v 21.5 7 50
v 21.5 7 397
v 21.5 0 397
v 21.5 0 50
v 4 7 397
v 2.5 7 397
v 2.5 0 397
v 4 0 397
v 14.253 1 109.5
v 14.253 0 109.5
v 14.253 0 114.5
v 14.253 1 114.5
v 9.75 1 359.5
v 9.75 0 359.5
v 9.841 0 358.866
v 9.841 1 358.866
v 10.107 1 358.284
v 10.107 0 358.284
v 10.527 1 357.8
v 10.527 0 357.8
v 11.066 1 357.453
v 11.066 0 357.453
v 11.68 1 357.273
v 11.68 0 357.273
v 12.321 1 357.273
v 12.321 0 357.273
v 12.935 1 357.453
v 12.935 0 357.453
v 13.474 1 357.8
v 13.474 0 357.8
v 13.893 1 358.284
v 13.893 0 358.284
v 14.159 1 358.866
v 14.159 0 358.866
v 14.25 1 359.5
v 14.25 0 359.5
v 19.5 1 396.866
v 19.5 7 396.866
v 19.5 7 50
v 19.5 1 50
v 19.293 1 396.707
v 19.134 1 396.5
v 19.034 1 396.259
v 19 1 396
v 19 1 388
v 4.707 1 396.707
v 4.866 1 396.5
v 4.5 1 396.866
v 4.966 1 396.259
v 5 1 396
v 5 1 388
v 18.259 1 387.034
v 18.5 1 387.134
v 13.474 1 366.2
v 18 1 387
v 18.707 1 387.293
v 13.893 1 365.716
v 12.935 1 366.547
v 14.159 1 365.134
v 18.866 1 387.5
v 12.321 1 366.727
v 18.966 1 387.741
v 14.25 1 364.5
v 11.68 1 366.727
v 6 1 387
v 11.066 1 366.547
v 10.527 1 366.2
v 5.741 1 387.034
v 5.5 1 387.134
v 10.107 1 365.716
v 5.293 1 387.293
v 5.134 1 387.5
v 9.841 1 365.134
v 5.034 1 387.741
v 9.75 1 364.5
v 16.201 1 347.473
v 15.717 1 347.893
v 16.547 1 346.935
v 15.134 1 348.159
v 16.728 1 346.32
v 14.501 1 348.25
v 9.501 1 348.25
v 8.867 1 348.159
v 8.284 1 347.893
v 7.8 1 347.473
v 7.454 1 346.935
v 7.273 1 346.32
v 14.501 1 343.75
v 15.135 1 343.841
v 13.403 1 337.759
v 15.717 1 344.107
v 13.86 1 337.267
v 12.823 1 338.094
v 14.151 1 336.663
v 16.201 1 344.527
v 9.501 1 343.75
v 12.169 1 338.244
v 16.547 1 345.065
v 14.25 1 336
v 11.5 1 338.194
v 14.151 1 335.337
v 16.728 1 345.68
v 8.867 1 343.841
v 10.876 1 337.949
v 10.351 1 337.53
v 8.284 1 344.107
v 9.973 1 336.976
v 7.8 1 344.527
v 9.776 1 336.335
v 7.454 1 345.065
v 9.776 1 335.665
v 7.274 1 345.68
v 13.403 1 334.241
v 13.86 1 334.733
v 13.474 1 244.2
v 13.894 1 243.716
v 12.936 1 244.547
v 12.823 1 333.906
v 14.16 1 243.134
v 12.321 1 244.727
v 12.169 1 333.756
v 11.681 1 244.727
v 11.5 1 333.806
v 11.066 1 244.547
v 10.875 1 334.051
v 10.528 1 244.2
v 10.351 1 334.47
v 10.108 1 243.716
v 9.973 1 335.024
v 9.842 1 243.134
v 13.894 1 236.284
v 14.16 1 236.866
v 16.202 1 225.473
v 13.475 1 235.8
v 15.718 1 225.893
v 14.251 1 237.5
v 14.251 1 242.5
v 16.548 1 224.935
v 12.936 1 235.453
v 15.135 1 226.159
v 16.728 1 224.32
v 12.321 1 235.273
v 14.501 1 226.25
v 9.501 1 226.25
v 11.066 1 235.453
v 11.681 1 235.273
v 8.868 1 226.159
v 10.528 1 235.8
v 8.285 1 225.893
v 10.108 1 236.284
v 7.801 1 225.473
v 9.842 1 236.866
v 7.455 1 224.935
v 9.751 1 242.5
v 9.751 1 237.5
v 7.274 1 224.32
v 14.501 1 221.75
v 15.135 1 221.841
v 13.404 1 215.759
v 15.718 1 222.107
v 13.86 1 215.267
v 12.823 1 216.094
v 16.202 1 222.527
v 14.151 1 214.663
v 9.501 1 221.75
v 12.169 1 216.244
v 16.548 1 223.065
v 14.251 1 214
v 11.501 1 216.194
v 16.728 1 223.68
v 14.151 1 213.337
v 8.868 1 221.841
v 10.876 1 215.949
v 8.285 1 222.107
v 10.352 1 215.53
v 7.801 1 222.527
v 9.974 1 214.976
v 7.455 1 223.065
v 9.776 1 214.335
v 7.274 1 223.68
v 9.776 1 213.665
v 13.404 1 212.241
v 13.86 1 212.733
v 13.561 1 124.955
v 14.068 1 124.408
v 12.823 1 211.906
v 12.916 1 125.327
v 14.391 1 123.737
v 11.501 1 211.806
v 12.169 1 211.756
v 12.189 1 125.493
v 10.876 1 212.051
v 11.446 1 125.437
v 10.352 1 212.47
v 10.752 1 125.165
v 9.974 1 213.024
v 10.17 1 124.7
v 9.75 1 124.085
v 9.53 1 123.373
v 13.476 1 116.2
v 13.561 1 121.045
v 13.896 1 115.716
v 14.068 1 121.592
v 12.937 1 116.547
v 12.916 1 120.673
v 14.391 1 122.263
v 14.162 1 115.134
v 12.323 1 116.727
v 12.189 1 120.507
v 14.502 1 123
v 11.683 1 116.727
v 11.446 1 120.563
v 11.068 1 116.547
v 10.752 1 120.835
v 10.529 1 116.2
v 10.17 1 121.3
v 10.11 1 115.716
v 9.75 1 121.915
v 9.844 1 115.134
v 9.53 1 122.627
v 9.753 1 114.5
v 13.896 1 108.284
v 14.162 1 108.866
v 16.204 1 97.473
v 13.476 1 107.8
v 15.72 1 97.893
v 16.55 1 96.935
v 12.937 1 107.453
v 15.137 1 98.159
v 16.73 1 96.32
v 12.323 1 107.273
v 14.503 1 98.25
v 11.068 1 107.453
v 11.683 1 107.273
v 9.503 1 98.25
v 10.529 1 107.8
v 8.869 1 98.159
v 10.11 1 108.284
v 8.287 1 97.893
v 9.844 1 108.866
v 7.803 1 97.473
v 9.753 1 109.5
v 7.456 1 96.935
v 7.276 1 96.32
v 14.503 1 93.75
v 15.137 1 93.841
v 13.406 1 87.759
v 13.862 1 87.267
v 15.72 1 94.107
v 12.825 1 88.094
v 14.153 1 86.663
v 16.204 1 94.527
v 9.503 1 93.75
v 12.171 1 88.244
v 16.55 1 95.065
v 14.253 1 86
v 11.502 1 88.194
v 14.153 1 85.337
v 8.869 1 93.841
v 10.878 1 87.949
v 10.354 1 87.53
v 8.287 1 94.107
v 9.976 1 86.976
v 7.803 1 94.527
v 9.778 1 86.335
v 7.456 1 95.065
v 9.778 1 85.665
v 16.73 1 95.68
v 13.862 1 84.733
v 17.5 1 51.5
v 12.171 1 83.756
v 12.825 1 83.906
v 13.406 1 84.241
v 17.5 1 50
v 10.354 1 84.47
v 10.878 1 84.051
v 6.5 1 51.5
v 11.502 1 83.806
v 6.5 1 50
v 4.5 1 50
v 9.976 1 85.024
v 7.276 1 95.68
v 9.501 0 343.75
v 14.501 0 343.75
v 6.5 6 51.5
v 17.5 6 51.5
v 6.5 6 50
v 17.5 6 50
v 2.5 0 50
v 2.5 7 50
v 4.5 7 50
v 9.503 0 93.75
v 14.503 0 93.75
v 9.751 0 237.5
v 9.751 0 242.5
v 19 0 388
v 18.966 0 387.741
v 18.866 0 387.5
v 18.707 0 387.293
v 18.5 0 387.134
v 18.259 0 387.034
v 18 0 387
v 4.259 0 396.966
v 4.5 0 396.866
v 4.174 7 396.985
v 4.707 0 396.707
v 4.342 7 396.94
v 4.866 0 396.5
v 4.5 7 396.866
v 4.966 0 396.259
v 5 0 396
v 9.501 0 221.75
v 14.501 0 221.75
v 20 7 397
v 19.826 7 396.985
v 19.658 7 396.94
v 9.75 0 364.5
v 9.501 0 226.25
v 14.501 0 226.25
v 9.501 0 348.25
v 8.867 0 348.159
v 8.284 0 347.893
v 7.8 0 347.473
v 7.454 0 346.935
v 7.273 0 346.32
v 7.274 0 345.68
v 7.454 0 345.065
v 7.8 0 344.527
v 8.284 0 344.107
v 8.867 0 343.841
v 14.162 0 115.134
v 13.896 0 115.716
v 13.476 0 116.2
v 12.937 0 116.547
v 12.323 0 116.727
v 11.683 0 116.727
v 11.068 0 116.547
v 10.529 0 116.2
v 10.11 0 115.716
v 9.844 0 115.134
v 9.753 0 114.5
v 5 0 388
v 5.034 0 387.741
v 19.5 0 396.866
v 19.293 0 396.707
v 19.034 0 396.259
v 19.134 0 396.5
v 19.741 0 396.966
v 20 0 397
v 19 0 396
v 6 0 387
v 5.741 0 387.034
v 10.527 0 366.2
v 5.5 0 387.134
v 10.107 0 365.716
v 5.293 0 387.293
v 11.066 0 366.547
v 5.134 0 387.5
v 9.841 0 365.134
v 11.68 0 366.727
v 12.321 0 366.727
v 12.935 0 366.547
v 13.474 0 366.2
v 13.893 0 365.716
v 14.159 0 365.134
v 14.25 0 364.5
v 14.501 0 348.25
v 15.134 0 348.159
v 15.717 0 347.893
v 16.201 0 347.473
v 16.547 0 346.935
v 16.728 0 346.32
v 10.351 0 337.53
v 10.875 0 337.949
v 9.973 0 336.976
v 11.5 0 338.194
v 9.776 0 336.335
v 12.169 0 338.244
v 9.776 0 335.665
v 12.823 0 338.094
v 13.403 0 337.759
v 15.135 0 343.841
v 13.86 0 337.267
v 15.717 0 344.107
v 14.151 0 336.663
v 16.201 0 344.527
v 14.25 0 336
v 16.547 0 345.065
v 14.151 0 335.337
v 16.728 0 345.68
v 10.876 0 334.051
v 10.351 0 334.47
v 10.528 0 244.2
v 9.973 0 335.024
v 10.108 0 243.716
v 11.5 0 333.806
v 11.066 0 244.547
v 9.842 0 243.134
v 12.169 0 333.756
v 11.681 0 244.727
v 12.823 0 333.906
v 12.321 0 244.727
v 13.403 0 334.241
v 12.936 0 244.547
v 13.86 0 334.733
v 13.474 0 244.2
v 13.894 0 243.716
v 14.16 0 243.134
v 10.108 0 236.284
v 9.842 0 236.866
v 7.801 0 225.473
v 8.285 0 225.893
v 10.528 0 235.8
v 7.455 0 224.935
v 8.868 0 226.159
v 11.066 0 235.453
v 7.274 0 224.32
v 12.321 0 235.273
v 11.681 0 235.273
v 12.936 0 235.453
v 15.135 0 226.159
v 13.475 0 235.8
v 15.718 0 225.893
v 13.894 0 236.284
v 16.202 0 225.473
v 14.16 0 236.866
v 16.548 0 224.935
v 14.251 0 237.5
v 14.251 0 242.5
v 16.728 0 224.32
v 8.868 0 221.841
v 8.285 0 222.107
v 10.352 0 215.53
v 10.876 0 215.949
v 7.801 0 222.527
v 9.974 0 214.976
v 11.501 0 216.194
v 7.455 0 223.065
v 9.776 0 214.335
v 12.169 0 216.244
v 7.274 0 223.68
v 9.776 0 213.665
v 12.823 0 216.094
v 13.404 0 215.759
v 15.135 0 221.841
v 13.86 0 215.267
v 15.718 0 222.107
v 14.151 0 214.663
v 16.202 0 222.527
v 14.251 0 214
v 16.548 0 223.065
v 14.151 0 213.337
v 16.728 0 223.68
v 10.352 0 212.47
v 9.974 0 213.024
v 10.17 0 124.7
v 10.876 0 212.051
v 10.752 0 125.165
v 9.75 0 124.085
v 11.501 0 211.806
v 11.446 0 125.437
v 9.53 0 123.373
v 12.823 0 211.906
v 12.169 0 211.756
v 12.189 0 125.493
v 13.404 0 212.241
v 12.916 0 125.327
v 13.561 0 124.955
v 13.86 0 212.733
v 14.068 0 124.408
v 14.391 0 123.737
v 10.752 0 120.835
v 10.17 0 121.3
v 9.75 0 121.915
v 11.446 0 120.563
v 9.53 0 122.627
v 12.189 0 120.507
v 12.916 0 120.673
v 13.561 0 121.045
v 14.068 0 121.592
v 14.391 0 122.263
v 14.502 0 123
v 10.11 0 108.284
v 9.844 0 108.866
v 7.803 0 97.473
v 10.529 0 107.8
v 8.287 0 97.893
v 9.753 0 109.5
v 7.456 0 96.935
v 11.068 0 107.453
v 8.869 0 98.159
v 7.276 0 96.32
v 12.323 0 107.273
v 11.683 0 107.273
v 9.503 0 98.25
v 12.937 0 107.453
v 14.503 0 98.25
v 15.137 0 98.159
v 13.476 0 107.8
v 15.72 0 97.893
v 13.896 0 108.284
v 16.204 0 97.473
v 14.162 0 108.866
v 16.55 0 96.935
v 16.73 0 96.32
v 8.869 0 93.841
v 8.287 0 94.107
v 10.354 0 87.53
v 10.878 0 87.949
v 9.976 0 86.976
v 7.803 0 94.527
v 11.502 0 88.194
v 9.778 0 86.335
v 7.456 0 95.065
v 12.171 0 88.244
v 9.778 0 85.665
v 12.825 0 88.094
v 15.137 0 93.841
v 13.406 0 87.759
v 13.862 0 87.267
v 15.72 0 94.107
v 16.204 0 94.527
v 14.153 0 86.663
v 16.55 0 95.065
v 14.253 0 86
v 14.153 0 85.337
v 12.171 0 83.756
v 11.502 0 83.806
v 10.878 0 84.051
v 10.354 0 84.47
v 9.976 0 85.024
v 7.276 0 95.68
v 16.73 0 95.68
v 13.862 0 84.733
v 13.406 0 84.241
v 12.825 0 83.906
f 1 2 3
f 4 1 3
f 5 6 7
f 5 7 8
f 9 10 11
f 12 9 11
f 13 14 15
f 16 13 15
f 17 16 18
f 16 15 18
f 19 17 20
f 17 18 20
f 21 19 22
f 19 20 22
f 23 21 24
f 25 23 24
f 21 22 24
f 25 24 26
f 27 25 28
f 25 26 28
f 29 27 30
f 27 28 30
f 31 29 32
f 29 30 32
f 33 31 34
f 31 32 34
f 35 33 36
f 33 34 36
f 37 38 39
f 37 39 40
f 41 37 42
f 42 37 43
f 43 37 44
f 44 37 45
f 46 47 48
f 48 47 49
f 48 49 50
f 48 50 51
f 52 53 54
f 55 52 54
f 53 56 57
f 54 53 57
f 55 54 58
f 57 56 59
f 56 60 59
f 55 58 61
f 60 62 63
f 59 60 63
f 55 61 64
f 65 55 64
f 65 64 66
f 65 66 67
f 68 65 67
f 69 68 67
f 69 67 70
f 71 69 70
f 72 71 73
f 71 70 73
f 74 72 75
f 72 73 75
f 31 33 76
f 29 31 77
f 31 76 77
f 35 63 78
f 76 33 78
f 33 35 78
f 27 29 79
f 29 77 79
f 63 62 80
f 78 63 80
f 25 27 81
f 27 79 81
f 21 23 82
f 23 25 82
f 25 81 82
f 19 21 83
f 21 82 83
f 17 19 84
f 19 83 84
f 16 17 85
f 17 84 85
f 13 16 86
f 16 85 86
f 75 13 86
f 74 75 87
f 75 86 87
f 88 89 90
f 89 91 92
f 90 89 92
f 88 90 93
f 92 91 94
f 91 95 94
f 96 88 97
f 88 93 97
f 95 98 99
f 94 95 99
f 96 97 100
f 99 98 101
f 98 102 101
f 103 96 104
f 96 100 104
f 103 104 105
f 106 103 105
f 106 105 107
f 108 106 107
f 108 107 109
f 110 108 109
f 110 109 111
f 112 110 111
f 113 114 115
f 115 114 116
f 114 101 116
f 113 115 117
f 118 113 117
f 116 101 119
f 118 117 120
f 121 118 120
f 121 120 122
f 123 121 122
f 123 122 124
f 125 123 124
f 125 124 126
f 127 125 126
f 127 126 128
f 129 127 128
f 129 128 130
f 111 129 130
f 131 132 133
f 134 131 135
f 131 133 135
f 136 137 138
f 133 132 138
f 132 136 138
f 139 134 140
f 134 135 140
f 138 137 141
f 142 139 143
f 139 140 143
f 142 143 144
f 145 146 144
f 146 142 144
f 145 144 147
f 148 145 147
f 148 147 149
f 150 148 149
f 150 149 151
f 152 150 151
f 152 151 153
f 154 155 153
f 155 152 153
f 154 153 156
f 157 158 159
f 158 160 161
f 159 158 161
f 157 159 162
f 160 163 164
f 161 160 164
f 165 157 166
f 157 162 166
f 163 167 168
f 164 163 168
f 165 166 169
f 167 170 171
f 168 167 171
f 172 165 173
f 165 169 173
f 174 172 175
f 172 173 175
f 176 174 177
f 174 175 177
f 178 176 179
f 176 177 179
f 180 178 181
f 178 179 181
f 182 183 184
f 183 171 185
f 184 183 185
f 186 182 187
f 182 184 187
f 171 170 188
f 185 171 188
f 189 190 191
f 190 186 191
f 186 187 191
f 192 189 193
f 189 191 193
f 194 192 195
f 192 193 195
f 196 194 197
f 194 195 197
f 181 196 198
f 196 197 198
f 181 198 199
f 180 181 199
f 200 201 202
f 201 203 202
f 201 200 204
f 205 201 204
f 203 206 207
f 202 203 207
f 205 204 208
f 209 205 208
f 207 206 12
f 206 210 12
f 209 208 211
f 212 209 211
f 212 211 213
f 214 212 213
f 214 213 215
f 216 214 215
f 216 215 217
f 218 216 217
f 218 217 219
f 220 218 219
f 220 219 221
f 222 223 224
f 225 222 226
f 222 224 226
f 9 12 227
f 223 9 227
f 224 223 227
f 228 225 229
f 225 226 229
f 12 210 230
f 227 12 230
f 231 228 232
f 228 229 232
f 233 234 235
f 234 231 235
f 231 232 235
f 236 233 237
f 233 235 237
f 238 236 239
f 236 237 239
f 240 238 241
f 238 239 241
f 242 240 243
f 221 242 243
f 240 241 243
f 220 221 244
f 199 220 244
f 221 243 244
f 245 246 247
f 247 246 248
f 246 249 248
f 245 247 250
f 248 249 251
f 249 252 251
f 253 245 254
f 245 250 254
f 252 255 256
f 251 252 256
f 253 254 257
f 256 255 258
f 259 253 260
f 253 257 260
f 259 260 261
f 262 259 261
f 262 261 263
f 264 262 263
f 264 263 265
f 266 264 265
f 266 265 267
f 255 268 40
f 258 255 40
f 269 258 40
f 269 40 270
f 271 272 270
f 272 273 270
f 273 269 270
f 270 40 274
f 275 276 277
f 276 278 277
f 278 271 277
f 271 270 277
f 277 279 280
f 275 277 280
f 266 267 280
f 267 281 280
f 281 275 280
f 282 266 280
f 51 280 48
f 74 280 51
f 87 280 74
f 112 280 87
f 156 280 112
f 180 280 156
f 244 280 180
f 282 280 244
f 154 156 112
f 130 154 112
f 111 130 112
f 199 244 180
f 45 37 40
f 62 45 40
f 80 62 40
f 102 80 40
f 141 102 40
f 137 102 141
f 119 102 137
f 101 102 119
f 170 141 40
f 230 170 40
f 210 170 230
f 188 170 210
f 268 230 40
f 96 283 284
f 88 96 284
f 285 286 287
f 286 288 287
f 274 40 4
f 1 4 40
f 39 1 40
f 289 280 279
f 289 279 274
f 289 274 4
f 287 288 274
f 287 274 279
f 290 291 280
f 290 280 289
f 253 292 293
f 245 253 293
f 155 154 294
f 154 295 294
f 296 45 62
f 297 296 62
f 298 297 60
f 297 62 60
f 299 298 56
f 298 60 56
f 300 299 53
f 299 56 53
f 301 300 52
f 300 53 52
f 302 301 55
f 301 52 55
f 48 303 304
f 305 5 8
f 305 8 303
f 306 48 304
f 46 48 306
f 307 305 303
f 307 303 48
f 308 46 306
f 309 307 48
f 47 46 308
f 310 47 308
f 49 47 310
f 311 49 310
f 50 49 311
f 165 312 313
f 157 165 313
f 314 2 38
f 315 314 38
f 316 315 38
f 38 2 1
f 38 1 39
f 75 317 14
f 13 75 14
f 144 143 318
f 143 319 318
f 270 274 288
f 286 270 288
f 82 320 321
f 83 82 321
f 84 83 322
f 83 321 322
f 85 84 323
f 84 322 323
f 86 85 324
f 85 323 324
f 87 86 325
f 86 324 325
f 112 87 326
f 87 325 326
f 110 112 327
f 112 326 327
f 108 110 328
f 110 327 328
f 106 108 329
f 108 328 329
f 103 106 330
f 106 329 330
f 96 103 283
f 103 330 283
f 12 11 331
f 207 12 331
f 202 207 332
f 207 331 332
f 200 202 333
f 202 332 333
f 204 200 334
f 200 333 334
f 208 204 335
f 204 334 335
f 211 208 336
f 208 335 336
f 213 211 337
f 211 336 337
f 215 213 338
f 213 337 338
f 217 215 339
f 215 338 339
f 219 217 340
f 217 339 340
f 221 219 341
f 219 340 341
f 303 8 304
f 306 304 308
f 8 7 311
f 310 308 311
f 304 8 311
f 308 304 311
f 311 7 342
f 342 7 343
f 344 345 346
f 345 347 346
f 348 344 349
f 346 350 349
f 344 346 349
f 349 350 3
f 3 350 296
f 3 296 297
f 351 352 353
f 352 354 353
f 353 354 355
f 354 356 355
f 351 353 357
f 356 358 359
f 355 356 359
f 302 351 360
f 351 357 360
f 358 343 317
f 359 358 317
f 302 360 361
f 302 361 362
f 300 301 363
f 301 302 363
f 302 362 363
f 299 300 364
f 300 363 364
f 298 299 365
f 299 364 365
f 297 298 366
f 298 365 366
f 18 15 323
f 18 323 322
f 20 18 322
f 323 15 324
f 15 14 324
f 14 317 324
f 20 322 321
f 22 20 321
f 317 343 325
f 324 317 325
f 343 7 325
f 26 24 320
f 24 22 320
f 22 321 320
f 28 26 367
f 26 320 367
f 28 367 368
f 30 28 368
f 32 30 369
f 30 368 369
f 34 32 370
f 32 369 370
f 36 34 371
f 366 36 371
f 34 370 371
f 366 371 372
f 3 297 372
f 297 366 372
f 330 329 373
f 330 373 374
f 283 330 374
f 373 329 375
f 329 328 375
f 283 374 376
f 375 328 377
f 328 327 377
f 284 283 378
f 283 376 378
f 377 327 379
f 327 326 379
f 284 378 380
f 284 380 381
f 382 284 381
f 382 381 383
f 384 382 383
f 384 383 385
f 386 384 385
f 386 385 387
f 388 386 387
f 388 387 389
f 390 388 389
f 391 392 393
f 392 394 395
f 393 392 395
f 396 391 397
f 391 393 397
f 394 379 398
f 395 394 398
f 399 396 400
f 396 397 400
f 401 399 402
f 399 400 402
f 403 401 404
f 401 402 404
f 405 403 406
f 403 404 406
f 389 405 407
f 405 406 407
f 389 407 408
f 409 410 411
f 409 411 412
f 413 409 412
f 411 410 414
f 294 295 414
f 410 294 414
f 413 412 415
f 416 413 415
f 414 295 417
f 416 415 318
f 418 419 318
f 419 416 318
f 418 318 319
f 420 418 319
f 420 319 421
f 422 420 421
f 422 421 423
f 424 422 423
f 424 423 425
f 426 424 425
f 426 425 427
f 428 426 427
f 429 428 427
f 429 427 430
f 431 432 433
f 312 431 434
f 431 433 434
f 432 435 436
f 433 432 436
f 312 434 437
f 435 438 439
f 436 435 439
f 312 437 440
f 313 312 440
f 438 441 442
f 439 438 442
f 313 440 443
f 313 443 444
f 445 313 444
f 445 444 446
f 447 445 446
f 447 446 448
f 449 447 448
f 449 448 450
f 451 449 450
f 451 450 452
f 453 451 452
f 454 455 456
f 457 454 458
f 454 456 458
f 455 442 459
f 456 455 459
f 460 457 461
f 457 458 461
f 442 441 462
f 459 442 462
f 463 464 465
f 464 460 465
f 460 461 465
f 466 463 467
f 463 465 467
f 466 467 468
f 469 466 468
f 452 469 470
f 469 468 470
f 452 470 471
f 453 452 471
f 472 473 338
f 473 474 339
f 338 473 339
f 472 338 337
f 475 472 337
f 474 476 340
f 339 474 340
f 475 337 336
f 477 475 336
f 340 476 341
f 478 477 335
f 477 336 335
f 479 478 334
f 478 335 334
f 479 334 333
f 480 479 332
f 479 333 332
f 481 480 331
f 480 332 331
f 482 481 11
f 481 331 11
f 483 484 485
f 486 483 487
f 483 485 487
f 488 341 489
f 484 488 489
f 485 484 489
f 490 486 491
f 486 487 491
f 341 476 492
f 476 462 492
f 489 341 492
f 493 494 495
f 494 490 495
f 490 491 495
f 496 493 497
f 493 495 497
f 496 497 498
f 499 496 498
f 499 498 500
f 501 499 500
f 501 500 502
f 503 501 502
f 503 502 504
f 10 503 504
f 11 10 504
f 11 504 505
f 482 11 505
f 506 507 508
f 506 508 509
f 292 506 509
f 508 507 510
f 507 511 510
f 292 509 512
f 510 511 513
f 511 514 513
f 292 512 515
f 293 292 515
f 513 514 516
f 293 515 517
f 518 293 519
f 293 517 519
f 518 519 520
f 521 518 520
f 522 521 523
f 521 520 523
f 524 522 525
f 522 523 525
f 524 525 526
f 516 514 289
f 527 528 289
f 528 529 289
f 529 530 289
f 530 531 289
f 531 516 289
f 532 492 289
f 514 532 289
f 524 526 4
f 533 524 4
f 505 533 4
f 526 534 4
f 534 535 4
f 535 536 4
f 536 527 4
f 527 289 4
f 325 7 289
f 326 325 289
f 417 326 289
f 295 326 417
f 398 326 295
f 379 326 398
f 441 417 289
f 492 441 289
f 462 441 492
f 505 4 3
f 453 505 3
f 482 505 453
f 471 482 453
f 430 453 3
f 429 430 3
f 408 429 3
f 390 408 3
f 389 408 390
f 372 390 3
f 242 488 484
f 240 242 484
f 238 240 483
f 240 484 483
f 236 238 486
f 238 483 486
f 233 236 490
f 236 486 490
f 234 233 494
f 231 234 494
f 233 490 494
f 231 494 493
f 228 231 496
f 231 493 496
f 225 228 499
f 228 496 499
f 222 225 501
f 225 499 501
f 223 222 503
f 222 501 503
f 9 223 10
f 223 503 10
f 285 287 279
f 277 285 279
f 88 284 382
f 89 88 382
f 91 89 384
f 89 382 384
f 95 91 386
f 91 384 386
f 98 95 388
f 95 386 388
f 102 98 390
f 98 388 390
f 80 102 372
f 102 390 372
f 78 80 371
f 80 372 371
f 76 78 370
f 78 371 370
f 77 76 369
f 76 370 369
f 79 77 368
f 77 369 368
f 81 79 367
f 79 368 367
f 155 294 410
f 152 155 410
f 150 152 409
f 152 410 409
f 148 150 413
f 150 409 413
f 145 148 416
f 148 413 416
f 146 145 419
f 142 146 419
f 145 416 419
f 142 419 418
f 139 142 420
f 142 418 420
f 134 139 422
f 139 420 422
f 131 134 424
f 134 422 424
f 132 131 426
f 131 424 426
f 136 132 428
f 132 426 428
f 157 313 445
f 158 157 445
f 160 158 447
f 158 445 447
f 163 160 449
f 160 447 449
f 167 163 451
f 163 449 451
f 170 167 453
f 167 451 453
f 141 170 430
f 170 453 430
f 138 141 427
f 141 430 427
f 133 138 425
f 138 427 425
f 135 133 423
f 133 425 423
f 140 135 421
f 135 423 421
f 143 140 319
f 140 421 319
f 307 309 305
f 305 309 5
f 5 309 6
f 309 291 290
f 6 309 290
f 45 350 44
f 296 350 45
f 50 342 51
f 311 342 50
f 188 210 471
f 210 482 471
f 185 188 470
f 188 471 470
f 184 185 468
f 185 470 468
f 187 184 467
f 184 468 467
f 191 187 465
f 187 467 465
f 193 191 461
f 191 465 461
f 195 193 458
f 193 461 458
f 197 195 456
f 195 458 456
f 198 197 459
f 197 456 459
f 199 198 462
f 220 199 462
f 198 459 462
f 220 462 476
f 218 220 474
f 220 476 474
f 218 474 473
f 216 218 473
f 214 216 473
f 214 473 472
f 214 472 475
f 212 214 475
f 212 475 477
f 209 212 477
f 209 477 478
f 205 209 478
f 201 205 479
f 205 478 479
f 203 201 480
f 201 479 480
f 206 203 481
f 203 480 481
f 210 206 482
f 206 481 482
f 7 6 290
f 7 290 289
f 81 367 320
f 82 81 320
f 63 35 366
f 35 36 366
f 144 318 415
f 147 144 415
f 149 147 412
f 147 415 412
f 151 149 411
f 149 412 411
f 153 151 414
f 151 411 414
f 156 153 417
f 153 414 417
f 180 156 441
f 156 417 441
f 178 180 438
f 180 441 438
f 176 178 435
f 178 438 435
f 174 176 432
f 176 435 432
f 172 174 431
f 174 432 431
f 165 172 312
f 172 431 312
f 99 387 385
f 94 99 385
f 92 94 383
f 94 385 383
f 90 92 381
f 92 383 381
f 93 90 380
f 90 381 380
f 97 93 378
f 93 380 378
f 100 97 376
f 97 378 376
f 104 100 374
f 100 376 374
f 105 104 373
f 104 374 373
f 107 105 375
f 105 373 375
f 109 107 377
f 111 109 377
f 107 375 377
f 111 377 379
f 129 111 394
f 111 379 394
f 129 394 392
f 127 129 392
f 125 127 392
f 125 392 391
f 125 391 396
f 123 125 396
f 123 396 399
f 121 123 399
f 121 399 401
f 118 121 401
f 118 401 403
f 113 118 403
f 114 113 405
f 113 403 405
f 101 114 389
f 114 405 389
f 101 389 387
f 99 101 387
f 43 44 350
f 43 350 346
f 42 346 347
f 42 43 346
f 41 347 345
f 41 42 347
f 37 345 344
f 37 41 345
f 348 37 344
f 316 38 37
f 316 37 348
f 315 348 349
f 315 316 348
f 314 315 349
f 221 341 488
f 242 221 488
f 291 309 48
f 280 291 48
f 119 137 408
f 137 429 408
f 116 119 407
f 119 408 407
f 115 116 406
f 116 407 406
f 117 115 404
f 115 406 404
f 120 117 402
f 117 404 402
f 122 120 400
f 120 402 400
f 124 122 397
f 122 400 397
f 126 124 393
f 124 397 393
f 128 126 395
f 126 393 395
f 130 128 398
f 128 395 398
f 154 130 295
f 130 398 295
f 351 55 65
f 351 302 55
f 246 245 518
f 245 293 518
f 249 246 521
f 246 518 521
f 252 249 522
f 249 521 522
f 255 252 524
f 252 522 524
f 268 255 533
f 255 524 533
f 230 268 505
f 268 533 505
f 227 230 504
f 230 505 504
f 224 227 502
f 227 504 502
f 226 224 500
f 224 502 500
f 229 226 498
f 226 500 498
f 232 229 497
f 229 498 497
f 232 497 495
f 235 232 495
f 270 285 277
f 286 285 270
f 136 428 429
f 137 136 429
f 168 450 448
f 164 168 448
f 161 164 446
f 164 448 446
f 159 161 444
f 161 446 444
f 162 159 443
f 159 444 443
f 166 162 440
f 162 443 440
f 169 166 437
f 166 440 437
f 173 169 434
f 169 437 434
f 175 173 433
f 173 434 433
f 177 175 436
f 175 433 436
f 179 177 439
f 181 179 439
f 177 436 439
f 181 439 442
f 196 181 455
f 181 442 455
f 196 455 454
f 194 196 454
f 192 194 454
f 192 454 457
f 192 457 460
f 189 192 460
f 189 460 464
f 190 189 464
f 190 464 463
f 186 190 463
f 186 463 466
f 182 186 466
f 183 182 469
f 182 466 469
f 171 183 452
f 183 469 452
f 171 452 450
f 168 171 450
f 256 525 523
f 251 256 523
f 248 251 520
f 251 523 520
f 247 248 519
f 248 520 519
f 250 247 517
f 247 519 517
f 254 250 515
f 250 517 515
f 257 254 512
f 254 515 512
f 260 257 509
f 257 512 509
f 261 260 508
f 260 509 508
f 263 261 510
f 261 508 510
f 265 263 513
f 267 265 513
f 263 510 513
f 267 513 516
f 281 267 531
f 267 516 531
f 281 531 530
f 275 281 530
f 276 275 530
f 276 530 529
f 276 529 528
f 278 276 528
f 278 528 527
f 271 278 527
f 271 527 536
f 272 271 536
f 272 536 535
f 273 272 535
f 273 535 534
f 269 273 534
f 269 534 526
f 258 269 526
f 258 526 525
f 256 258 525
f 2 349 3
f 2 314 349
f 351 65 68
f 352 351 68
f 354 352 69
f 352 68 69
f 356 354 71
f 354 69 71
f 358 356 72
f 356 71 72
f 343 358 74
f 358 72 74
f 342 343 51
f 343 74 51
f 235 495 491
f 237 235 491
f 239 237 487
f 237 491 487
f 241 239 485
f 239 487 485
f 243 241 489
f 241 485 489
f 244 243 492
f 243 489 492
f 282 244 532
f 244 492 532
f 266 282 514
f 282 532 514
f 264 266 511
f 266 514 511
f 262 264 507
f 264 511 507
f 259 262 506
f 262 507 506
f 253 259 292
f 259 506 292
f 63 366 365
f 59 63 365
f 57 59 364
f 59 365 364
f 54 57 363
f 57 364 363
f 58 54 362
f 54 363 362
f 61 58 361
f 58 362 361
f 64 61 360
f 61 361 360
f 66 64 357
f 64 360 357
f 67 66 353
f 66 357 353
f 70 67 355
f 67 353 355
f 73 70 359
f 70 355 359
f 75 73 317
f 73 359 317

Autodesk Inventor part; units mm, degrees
ref_plane "YZ Plane" through (0, 0, 0) normal (1, 0, 0) x (0, 1, 0)
ref_plane "XZ Plane" through (0, 0, 0) normal (0, 1, 0) x (-1, 0, 0)
ref_plane "XY Plane" through (0, 0, 0) normal (0, 0, 1) x (1, 0, 0)
sketch "Эскиз1" plane through (0, 0, 0) normal (0, 0, 1) x (1, 0, 0)
  line L0 (0, 0) -> (24, 0)
  line L1 (24, 0) -> (24, 7)
  line L2 (24, 7) -> (0, 7)
  line L3 (0, 7) -> (0, 0)
  line L4 (0, 1) -> (24, 1)
  line L5 (2, 7) -> (2, 0)
  line L6 (22, 7) -> (22, 0)
  point P0 (0, 3.5)
  point P1 (12, 0)
  point P2 (2, 1)
  point P3 (22, 1)
  dimension "d0" = 24
  dimension "d1" = 7
  dimension "d2" = 2
  dimension "d3" = 2
  dimension "d4" = 1
extrude "Выдавливание1" add sketch "Эскиз1" along normal blind 397 contours L3 L4 L5 L0 | L5 L4 L6 L0 | L3 L2 L5 L4 | L6 L4 L1 L0 | L6 L2 L1 L4
sketch "Эскиз3" plane through (0, 0, 0) normal (0, -1, 0) x (1, 0, 0)
  line L0 (12.0033, 0) -> (12, 397)
  line L1 (22, 397) -> (2, 397) projected
  line L2 (24, 0) -> (24, 397) projected
  circle A0 centre (12.0005, 336) radius 2.25
  line L3 (12.0002, 366.75) -> (12.0003, 357.25) construction
  line L4 (9.7503, 364.5) -> (9.7503, 359.5)
  line L5 (14.2503, 359.5) -> (14.2503, 364.5)
  arc A1 (14.2503, 364.5) -> (9.7503, 364.5) centre (12.0003, 364.5) ccw
  arc A2 (9.7503, 359.5) -> (14.2503, 359.5) centre (12.0003, 359.5) ccw
  line L6 (16.7506, 346) -> (7.2506, 346) construction
  line L7 (14.5006, 348.25) -> (9.5006, 348.25)
  line L8 (9.5007, 343.75) -> (14.5007, 343.75)
  arc A3 (14.5007, 343.75) -> (14.5006, 348.25) centre (14.5006, 346) ccw
  arc A4 (9.5006, 348.25) -> (9.5007, 343.75) centre (9.5006, 346) ccw
  circle A5 centre (12.0013, 214) radius 2.25
  line L9 (12.001, 244.75) -> (12.0011, 235.25) construction
  line L10 (9.751, 242.5) -> (9.7511, 237.5)
  line L11 (14.2511, 237.5) -> (14.251, 242.5)
  arc A6 (14.251, 242.5) -> (9.751, 242.5) centre (12.001, 242.5) ccw
  arc A7 (9.7511, 237.5) -> (14.2511, 237.5) centre (12.0011, 237.5) ccw
  arc A8 (9.5014, 226.25) -> (9.5014, 221.75) centre (9.5014, 224) ccw
  line L12 (9.5014, 221.75) -> (14.5014, 221.75)
  line L13 (14.5014, 226.25) -> (9.5014, 226.25)
  line L14 (16.7514, 224) -> (7.2514, 224) construction
  arc A9 (14.5014, 221.75) -> (14.5014, 226.25) centre (14.5014, 224) ccw
  line L15 (9.5031, 93.75) -> (14.5031, 93.75)
  line L16 (16.7531, 96) -> (7.2531, 96) construction
  arc A10 (9.5031, 98.25) -> (9.5031, 93.75) centre (9.5031, 96) ccw
  line L17 (14.5031, 98.25) -> (9.5031, 98.25)
  arc A11 (14.5031, 93.75) -> (14.5031, 98.25) centre (14.5031, 96) ccw
  circle A12 centre (12.003, 86) radius 2.25
  arc A13 (9.7528, 109.5) -> (14.2528, 109.5) centre (12.0028, 109.5) ccw
  line L18 (14.2528, 109.5) -> (14.2528, 114.5)
  line L19 (9.7528, 114.5) -> (9.7528, 109.5)
  arc A14 (14.2528, 114.5) -> (9.7528, 114.5) centre (12.0028, 114.5) ccw
  line L20 (12.0027, 116.75) -> (12.0028, 107.25) construction
  circle A15 centre (12.0023, 123) radius 2.5
  point P0 (12.0003, 362)
  point P1 (12.0006, 346)
  point P2 (12.001, 240)
  point P3 (12.0014, 224)
  point P4 (12.0031, 96)
  point P5 (12.0028, 112)
  dimension "d47" = 4.5
  dimension "d49" = 9.5
  dimension "d50" = 4.5
  dimension "d51" = 9.5
  dimension "d52" = 4.5
  dimension "d53" = 10
  dimension "d54" = 16
  dimension "d55" = 70
  dimension "d56" = 4.5
  dimension "d57" = 9.5
  dimension "d58" = 4.5
  dimension "d59" = 9.5
  dimension "d60" = 4.5
  dimension "d61" = 10
  dimension "d62" = 16
  dimension "d63" = 138
  dimension "d64" = 4.5
  dimension "d65" = 9.5
  dimension "d66" = 4.5
  dimension "d67" = 9.5
  dimension "d68" = 4.5
  dimension "d69" = 10
  dimension "d70" = 16
  dimension "d71" = 138
  dimension "d72" = 5
extrude "Выдавливание2" cut sketch "Эскиз3" against normal blind 10
sketch "Эскиз4" plane through (0, 0, 0) normal (0, 0, -1) x (-1, 0, 0)
  line L0 (-2, 7) -> (0, 7) projected
  line L1 (-2, 1) -> (-2, 7) projected
  line L2 (-22, 1) -> (-2, 1) projected
  line L3 (-22, 7) -> (-22, 1) projected
  line L4 (-24, 7) -> (-22, 7) projected
  line L5 (-24, 0) -> (-24, 7) projected
  line L6 (0, 0) -> (-24, 0) projected
  line L7 (0, 7) -> (0, 0) projected
  line L8 (-12, 9) -> (-20, 9)
  line L9 (-20, 9) -> (-20, 0)
  line L10 (-12, 9) -> (-4, 9)
  line L11 (-4, 9) -> (-4, 0)
  point P0 (-20, 1)
  point P1 (-4, 1)
extrude "Выдавливание3" add sketch "Эскиз4" against normal blind 1.5 contours L2 L9 L8 L10 L11
sketch "Эскиз5" plane through (0, 0, 0) normal (0, 0, -1) x (-1, 0, 0)
  line L0 (0, 0) -> (-24, 0) projected
  line L1 (-24, 7) -> (-21.5, 7)
  line L2 (-21.5, 7) -> (-21.5, 0)
  line L3 (-21.5, 0) -> (-24, 0)
  line L4 (-24, 0) -> (-24, 7)
  line L5 (0, 7) -> (-2.5, 7)
  line L6 (-2.5, 7) -> (-2.5, 0)
  line L7 (-2.5, 0) -> (0, 0)
  line L8 (0, 0) -> (0, 7)
  line L9 (-21.5, 7) -> (-19.5, 7)
  line L10 (-19.5, 7) -> (-19.5, 0)
  line L11 (-19.5, 0) -> (-21.5, 0)
  line L12 (-21.5, 0) -> (-21.5, 7)
  line L13 (-2.5, 7) -> (-4.5, 7)
  line L14 (-4.5, 7) -> (-4.5, 0)
  line L15 (-4.5, 0) -> (-2.5, 0)
  line L16 (-2.5, 0) -> (-2.5, 7)
  line L17 (-19.5, 0) -> (-17.5, 0)
  line L18 (-4.5, 0) -> (-6.5, 0)
  line L19 (-20, 9) -> (-4, 9) projected
  line L20 (-17.5, 0) -> (-6.5, 0)
  line L21 (-6.5, 0) -> (-6.5, 9)
  line L22 (-6.5, 9) -> (-17.5, 9)
  line L23 (-17.5, 9) -> (-17.5, 0)
  line L24 (-17.5, 7) -> (-21, 7)
  line L25 (-21, 7) -> (-21, 9)
  line L26 (-21, 9) -> (-17.5, 9)
  line L27 (-17.5, 9) -> (-17.5, 7)
  line L28 (-6.5, 7) -> (-4, 7)
  line L29 (-4, 7) -> (-4, 9)
  line L30 (-4, 9) -> (-6.5, 9)
  line L31 (-6.5, 9) -> (-6.5, 7)
  dimension "d36" = 2.5
  dimension "d37" = 2.5
  dimension "d38" = 2
  dimension "d39" = 2
  dimension "d40" = 2
  dimension "d41" = 2
extrude "Выдавливание4" cut sketch "Эскиз5" against normal through all contours L0 L6 L5 L8 | L0 L21 L28 L14 | L28 L21 L19 L29 L13 | L0 L10 L24 L23 | L24 L9 L25 L26 L19 L23 | L0 L4 L1 L2
sketch "Эскиз6" plane through (0, 0, 0) normal (0, 0, -1) x (-1, 0, 0)
  line L0 (-19.5, 0) -> (-21.5, 0) projected
  line L1 (-19.5, 0) -> (-19.5, 7) projected
  line L2 (-21.5, 0) -> (-19.5, 0)
  line L3 (-19.5, 0) -> (-19.5, 7)
  line L4 (-19.5, 7) -> (-21.5, 7)
  line L5 (-21.5, 7) -> (-21.5, 0)
  line L6 (-4.5, 1) -> (-4.5, 7) projected
  line L7 (-2.5, 0) -> (-4.5, 0) projected
  line L8 (-4.5, 7) -> (-2.5, 7)
  line L9 (-2.5, 7) -> (-2.5, 0)
  line L10 (-2.5, 0) -> (-4.5, 0)
  line L11 (-4.5, 0) -> (-4.5, 7)
  line L12 (-21.5, 1) -> (-2.5, 1)
  line L13 (-2.5, 1) -> (-2.5, 0)
  line L14 (-2.5, 0) -> (-21.5, 0)
  line L15 (-21.5, 0) -> (-21.5, 1)
  line L16 (-6.5, 0) -> (-6.5, 9) projected
  line L17 (-6.5, 1) -> (-6.5, 0)
  line L18 (-17.5, 1) -> (-6.5, 1) projected
  line L19 (-17.5, 9) -> (-17.5, 0) projected
  line L20 (-17.5, 1) -> (-17.5, 0)
  point P0 (0, 0)
  point P1 (-19.5, 1)
extrude "Выдавливание5" add sketch "Эскиз6" against normal up to surface (397 mm away) contours L1 L12 L19 L14 | L12 L5 L4 L1 | L16 L12 L11 L14 | L6 L8 L9 L12
sketch "Эскиз7" plane through (2.5, 0, 0) normal (0, -1, 0) x (1, 0, 0)
  line L0 (0, 397) -> (19, 397) projected
  line L1 (9.5, 397) -> (2.5, 397)
  line L2 (9.5, 397) -> (16.5, 397)
  line L3 (16.5, 397) -> (16.5, 387)
  line L4 (16.5, 387) -> (2.5, 387)
  line L5 (2.5, 387) -> (2.5, 397)
  point P0 (-2.5, 0)
  dimension "d73" = 7
  dimension "d74" = 7
  dimension "d75" = 10
extrude "Выдавливание6" cut sketch "Эскиз7" against normal blind 10
fillet "Сопряжение1" radius 1 4 edges at (5, 0.5, 387) (19, 0.5, 387) (19, 0.5, 397) (5, 0.5, 397)
sketch "Эскиз8" plane through (0, 0, 0) normal (0, 0, -1) x (-1, 0, 0)
  line L0 (-6.5, 9) -> (-17.5, 9) projected
  line L1 (-17.5, 9) -> (-17.5, 1) projected
  line L2 (-6.5, 9) -> (-17.5, 9)
  line L3 (-17.5, 9) -> (-17.5, 6)
  line L4 (-17.5, 6) -> (-6.5, 6)
  line L5 (-6.5, 6) -> (-6.5, 9)
  point P0 (0, 0)
extrude "Выдавливание7" cut sketch "Эскиз8" against normal blind 10
sketch "Эскиз9" plane through (0, 0, 1.5) normal (0, 0, 1) x (1, 0, 0)
  line L0 (17.5, 6) -> (6.5, 6) projected
  line L1 (6.5, 6) -> (6.5, 1) projected
  line L2 (17.5, 1) -> (6.5, 1) projected
  line L3 (17.5, 1) -> (17.5, 6) projected
  point P0 (0, 0)
extrude "Выдавливание8" add sketch "Эскиз9" along normal blind 50
sketch "Эскиз10" plane through (0, 0, 0) normal (0, 0, -1) x (-1, 0, 0)
  line L0 (-30, 24) -> (32, 24)
  line L1 (32, 24) -> (32, -21)
  line L2 (32, -21) -> (-30, -21)
  line L3 (-30, -21) -> (-30, 24)
  point P0 (0, 0)
extrude "Выдавливание9" cut sketch "Эскиз10" against normal blind 50
equation "\"d31\" = d61"
equation "\"d76\" = d61"
equation "\"d79\" = d61"
properties part number "3 часть направляшки 35"
